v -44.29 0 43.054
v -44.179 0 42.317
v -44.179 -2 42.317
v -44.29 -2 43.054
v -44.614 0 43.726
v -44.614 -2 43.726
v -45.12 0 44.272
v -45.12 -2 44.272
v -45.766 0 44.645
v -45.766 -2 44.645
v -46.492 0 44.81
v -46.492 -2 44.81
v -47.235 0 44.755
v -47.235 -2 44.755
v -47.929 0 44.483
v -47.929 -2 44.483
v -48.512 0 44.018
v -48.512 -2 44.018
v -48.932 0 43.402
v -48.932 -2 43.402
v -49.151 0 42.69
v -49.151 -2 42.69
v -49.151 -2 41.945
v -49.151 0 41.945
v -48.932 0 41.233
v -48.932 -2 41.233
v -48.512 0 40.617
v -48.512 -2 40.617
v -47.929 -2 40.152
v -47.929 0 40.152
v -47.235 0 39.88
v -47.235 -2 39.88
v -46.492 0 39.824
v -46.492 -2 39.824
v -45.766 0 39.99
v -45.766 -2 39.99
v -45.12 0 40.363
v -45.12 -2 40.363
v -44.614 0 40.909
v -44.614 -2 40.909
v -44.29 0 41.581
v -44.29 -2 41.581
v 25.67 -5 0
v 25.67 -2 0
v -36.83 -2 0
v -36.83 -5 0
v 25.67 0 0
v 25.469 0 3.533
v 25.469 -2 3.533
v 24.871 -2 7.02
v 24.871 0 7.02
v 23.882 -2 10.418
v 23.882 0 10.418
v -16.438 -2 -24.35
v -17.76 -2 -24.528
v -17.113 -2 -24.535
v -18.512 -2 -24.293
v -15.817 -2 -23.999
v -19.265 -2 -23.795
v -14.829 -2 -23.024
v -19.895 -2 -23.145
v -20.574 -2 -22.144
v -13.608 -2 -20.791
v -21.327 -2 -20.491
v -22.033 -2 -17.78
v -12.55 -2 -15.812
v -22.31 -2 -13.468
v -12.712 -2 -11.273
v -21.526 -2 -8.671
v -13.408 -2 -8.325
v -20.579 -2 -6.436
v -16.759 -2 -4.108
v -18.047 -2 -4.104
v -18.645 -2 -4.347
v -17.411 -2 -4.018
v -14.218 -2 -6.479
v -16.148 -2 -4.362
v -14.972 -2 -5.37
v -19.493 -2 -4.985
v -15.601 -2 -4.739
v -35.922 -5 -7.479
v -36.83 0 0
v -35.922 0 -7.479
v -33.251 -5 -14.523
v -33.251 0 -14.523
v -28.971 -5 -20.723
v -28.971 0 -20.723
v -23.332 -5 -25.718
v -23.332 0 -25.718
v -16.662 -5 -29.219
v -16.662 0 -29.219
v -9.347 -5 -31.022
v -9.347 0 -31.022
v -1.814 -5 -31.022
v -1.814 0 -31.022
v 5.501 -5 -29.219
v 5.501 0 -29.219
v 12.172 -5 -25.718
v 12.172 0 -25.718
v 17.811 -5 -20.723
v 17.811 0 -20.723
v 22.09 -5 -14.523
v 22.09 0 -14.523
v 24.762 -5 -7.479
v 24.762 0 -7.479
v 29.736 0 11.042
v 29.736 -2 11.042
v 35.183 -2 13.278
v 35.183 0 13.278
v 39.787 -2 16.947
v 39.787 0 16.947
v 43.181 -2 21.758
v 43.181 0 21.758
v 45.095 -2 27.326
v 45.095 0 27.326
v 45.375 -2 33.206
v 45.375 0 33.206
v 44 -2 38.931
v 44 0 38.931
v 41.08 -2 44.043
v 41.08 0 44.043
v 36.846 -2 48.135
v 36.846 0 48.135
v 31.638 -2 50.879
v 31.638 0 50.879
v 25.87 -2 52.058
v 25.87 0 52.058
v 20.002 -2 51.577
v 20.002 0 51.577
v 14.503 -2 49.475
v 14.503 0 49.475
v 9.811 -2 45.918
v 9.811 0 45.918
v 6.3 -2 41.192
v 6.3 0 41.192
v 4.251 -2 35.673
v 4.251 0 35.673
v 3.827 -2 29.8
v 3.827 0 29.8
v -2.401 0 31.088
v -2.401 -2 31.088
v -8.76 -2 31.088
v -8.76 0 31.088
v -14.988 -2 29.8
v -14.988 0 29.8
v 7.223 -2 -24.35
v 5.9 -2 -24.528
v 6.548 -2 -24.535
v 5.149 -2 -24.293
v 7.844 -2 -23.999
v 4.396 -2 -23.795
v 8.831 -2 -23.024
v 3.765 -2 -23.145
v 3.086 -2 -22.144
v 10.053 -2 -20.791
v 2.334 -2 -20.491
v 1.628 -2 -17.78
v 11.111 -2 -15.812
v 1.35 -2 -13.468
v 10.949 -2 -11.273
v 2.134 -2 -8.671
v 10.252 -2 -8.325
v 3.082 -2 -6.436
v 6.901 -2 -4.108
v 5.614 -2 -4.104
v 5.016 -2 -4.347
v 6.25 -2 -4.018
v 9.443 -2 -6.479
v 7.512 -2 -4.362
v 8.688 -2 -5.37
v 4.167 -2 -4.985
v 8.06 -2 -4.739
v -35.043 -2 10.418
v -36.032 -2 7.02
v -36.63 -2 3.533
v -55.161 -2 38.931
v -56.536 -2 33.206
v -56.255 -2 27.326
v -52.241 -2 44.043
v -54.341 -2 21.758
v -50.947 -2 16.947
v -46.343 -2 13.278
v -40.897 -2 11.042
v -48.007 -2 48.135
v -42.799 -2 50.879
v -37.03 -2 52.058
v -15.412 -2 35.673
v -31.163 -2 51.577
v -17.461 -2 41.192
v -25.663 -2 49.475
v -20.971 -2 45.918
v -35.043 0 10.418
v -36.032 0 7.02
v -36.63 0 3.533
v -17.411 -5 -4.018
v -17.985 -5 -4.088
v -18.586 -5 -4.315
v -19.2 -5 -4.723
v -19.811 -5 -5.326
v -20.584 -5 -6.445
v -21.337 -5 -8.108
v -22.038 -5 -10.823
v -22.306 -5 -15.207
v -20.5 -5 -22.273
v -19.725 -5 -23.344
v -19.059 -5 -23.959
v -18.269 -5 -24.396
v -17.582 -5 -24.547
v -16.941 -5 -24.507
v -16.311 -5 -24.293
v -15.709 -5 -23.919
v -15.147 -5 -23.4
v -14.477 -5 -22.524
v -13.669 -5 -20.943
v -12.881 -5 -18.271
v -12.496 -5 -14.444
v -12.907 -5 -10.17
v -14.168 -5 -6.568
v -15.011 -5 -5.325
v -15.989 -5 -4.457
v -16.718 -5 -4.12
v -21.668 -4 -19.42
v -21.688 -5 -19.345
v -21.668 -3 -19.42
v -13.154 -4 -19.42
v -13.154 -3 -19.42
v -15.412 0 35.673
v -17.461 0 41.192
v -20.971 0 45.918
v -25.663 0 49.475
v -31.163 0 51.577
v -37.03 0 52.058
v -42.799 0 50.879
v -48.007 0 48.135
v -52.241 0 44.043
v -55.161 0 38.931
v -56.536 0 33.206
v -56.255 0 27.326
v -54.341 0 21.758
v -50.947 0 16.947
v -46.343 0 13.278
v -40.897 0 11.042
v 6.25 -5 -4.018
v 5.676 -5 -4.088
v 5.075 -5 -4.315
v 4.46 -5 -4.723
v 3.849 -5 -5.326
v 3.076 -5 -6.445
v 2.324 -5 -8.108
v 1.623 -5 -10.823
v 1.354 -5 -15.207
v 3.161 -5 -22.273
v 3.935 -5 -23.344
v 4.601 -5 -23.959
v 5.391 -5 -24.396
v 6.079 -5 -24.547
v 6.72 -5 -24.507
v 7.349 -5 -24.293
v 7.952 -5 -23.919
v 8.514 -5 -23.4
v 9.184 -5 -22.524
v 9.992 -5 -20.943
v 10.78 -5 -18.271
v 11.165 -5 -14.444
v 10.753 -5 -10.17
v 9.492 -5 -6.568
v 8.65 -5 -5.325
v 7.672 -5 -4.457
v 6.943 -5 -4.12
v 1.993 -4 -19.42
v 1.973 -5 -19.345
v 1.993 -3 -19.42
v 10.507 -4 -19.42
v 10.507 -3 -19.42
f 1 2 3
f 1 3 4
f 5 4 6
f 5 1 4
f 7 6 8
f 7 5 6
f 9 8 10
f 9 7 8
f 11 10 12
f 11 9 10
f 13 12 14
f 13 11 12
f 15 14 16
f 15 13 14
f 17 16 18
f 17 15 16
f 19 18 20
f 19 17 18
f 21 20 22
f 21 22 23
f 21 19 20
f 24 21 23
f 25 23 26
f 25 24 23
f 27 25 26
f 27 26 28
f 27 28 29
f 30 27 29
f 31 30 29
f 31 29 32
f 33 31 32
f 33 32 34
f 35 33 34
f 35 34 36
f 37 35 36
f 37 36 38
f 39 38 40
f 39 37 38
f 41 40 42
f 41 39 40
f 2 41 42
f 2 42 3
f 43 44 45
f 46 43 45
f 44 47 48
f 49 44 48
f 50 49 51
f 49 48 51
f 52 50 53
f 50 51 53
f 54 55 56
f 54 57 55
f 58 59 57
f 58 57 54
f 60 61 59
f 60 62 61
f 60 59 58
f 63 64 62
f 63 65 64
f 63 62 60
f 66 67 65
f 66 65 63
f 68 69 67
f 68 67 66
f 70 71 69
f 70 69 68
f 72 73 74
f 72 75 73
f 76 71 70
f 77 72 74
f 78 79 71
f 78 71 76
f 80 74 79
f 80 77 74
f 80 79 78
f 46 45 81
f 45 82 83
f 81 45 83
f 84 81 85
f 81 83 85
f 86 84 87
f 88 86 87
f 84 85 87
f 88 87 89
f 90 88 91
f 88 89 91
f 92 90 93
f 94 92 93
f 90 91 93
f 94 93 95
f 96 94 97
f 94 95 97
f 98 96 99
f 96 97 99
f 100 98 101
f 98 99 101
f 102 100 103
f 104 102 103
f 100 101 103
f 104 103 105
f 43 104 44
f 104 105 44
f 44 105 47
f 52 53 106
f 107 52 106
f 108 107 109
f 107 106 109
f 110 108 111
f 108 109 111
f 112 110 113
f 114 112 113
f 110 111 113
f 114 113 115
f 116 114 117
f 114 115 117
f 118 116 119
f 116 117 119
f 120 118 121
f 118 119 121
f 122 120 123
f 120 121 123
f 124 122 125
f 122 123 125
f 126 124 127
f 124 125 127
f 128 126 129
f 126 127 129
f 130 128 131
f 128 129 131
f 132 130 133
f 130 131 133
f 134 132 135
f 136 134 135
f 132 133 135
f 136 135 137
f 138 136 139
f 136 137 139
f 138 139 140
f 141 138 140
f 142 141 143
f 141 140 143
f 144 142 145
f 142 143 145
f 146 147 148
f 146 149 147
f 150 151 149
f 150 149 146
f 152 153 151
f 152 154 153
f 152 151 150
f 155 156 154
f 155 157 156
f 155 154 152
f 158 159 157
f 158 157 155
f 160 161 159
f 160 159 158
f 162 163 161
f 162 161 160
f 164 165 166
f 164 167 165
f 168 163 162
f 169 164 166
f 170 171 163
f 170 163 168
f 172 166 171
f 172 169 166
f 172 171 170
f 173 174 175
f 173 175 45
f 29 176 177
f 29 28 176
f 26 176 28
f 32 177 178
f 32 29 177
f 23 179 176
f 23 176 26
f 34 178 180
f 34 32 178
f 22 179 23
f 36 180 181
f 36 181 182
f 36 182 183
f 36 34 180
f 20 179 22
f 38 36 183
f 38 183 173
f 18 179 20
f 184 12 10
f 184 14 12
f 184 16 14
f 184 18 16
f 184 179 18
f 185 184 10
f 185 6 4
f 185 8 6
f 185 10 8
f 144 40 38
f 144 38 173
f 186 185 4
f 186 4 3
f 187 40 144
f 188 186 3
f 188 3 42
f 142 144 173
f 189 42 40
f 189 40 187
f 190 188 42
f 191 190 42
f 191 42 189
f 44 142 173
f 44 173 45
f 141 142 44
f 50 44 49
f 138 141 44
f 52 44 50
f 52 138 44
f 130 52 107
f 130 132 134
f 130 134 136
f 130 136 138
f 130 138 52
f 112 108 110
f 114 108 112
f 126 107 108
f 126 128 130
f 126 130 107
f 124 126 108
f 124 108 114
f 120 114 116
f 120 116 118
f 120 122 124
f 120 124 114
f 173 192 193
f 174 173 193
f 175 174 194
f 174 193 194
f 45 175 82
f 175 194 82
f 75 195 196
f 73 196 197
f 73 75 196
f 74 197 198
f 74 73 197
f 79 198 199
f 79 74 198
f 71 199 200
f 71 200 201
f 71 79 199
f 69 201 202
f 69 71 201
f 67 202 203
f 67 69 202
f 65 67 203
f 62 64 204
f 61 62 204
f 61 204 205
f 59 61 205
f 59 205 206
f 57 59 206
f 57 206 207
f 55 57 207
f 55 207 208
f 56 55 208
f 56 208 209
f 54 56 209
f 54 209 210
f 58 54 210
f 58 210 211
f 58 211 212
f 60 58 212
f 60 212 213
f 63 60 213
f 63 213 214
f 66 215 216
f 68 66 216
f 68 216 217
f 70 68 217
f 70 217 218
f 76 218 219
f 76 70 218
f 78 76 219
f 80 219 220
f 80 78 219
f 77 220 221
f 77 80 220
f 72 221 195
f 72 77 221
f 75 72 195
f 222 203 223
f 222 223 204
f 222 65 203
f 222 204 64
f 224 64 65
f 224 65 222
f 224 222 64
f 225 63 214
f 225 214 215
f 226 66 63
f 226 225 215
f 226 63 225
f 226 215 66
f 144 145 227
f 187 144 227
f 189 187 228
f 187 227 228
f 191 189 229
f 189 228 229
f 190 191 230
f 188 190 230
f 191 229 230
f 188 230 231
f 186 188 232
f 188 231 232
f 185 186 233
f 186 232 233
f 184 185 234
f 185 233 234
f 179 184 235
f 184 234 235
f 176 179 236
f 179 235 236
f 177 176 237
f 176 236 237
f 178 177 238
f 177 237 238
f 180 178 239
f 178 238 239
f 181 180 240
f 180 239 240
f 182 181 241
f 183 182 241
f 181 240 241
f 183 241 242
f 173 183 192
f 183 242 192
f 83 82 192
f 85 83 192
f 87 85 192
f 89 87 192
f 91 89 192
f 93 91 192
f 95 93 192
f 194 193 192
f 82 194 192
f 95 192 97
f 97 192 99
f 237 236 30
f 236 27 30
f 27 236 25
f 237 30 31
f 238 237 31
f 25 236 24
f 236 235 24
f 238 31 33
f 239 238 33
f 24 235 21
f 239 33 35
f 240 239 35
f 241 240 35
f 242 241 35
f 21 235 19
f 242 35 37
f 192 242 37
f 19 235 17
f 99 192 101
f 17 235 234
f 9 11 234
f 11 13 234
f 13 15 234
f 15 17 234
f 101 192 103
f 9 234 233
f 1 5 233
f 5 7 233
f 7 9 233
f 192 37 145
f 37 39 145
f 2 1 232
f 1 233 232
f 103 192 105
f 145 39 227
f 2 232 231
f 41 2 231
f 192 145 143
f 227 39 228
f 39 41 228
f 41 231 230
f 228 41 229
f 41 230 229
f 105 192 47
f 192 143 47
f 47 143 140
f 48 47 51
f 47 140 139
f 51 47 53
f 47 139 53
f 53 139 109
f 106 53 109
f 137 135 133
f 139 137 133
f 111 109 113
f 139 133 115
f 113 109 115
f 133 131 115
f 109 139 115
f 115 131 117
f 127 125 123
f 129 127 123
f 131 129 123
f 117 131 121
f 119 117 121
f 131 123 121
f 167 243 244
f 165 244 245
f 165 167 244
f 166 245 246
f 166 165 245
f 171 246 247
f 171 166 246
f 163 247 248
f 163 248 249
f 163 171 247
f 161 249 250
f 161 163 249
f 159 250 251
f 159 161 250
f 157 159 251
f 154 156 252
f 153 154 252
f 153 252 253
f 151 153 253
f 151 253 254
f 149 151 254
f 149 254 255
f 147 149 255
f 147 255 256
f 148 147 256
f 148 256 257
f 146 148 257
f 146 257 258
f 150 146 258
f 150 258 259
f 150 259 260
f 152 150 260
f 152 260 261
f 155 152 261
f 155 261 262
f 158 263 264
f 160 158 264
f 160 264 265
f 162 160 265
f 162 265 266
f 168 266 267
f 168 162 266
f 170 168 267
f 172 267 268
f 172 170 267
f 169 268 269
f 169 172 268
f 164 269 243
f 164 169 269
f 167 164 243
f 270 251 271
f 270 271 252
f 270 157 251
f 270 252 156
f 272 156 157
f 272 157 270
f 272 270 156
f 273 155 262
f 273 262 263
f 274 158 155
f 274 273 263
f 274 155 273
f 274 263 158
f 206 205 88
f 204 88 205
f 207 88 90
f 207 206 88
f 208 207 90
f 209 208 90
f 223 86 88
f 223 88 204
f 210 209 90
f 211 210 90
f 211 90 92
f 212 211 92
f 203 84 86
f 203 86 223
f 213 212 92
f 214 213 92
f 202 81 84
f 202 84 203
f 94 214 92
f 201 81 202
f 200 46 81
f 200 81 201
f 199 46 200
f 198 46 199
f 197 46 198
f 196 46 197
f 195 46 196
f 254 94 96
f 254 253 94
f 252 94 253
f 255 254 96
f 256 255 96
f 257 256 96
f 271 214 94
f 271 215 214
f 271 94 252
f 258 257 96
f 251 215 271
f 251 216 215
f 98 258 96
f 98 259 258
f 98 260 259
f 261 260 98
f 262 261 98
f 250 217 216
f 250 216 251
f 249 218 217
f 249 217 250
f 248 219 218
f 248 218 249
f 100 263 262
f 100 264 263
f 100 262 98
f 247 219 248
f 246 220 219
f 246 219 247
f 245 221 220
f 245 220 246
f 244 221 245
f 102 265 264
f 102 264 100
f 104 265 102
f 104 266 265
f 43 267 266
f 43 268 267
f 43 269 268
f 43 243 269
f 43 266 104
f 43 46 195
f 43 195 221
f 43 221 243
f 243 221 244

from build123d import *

# Parameters (mm, degrees)
F0_R     = 2.5
F1_DEPTH = 2
F2_DEPTH = 5


with BuildPart() as f1:
    # F0 (on Front) → F1 (new body)
    with BuildSketch(Plane.XZ):
        with BuildLine():
            ThreePointArc((-14.98756, 29.800454), (-50.269077, 46.239108), (-35.042782, 10.41768))
            ThreePointArc((-35.042782, 10.41768), (-36.380222, 5.284967), (-36.830358, 0))
            Line((-36.830358, 0), (25.669642, 0))
            ThreePointArc((25.669642, 0), (25.219507, 5.284967), (23.882067, 10.41768))
            ThreePointArc((23.882067, 10.41768), (39.108362, 46.239108), (3.826845, 29.800454))
            ThreePointArc((3.826845, 29.800454), (-5.580358, 31.25), (-14.98756, 29.800454))
        make_face()
        with Locations((-46.679139, 42.317488)):
            Circle(F0_R, mode=Mode.SUBTRACT)
        with BuildLine():
            Line((25.669642, 0), (-36.830358, 0))
            ThreePointArc((-36.830358, 0), (-5.580358, -31.25), (25.669642, 0))
        make_face()
        with BuildLine():
            add(Edge.make_bspline(
                [(-17.410715, -4.017858), (-25.924373, -4.017858), (-21.667544, -19.419644), (-17.410715, -34.821431), (-13.153887, -19.419644), (-8.897058, -4.017858), (-17.410715, -4.017858)],
                knots=[0, 0, 0, 2.094395, 2.094395, 4.18879, 4.18879, 6.283185, 6.283185, 6.283185], degree=2, weights=[1, 0.5, 1, 0.5, 1, 0.5, 1]))
        make_face(mode=Mode.SUBTRACT)
        with BuildLine():
            add(Edge.make_bspline(
                [(6.25, -4.017858), (-2.263657, -4.017858), (1.993172, -19.419644), (6.25, -34.821431), (10.506829, -19.419644), (14.763657, -4.017858), (6.25, -4.017858)],
                knots=[0, 0, 0, 2.094395, 2.094395, 4.18879, 4.18879, 6.283185, 6.283185, 6.283185], degree=2, weights=[1, 0.5, 1, 0.5, 1, 0.5, 1]))
        make_face(mode=Mode.SUBTRACT)
        with BuildLine():
            add(Edge.make_bspline(
                [(-17.410715, -4.017858), (-25.924373, -4.017858), (-21.667544, -19.419644), (-17.410715, -34.821431), (-13.153887, -19.419644), (-8.897058, -4.017858), (-17.410715, -4.017858)],
                knots=[0, 0, 0, 2.094395, 2.094395, 4.18879, 4.18879, 6.283185, 6.283185, 6.283185], degree=2, weights=[1, 0.5, 1, 0.5, 1, 0.5, 1]))
        make_face()
        with BuildLine():
            add(Edge.make_bspline(
                [(6.25, -4.017858), (-2.263657, -4.017858), (1.993172, -19.419644), (6.25, -34.821431), (10.506829, -19.419644), (14.763657, -4.017858), (6.25, -4.017858)],
                knots=[0, 0, 0, 2.094395, 2.094395, 4.18879, 4.18879, 6.283185, 6.283185, 6.283185], degree=2, weights=[1, 0.5, 1, 0.5, 1, 0.5, 1]))
        make_face()
    extrude(amount=F1_DEPTH)

    # F0 (on Front) → F2 (join)
    with BuildSketch(Plane.XZ):
        with BuildLine():
            Line((25.669642, 0), (-36.830358, 0))
            ThreePointArc((-36.830358, 0), (-5.580358, -31.25), (25.669642, 0))
        make_face()
        with BuildLine():
            add(Edge.make_bspline(
                [(-17.410715, -4.017858), (-25.924373, -4.017858), (-21.667544, -19.419644), (-17.410715, -34.821431), (-13.153887, -19.419644), (-8.897058, -4.017858), (-17.410715, -4.017858)],
                knots=[0, 0, 0, 2.094395, 2.094395, 4.18879, 4.18879, 6.283185, 6.283185, 6.283185], degree=2, weights=[1, 0.5, 1, 0.5, 1, 0.5, 1]))
        make_face(mode=Mode.SUBTRACT)
        with BuildLine():
            add(Edge.make_bspline(
                [(6.25, -4.017858), (-2.263657, -4.017858), (1.993172, -19.419644), (6.25, -34.821431), (10.506829, -19.419644), (14.763657, -4.017858), (6.25, -4.017858)],
                knots=[0, 0, 0, 2.094395, 2.094395, 4.18879, 4.18879, 6.283185, 6.283185, 6.283185], degree=2, weights=[1, 0.5, 1, 0.5, 1, 0.5, 1]))
        make_face(mode=Mode.SUBTRACT)
    extrude(amount=F2_DEPTH)


solid = f1.part
